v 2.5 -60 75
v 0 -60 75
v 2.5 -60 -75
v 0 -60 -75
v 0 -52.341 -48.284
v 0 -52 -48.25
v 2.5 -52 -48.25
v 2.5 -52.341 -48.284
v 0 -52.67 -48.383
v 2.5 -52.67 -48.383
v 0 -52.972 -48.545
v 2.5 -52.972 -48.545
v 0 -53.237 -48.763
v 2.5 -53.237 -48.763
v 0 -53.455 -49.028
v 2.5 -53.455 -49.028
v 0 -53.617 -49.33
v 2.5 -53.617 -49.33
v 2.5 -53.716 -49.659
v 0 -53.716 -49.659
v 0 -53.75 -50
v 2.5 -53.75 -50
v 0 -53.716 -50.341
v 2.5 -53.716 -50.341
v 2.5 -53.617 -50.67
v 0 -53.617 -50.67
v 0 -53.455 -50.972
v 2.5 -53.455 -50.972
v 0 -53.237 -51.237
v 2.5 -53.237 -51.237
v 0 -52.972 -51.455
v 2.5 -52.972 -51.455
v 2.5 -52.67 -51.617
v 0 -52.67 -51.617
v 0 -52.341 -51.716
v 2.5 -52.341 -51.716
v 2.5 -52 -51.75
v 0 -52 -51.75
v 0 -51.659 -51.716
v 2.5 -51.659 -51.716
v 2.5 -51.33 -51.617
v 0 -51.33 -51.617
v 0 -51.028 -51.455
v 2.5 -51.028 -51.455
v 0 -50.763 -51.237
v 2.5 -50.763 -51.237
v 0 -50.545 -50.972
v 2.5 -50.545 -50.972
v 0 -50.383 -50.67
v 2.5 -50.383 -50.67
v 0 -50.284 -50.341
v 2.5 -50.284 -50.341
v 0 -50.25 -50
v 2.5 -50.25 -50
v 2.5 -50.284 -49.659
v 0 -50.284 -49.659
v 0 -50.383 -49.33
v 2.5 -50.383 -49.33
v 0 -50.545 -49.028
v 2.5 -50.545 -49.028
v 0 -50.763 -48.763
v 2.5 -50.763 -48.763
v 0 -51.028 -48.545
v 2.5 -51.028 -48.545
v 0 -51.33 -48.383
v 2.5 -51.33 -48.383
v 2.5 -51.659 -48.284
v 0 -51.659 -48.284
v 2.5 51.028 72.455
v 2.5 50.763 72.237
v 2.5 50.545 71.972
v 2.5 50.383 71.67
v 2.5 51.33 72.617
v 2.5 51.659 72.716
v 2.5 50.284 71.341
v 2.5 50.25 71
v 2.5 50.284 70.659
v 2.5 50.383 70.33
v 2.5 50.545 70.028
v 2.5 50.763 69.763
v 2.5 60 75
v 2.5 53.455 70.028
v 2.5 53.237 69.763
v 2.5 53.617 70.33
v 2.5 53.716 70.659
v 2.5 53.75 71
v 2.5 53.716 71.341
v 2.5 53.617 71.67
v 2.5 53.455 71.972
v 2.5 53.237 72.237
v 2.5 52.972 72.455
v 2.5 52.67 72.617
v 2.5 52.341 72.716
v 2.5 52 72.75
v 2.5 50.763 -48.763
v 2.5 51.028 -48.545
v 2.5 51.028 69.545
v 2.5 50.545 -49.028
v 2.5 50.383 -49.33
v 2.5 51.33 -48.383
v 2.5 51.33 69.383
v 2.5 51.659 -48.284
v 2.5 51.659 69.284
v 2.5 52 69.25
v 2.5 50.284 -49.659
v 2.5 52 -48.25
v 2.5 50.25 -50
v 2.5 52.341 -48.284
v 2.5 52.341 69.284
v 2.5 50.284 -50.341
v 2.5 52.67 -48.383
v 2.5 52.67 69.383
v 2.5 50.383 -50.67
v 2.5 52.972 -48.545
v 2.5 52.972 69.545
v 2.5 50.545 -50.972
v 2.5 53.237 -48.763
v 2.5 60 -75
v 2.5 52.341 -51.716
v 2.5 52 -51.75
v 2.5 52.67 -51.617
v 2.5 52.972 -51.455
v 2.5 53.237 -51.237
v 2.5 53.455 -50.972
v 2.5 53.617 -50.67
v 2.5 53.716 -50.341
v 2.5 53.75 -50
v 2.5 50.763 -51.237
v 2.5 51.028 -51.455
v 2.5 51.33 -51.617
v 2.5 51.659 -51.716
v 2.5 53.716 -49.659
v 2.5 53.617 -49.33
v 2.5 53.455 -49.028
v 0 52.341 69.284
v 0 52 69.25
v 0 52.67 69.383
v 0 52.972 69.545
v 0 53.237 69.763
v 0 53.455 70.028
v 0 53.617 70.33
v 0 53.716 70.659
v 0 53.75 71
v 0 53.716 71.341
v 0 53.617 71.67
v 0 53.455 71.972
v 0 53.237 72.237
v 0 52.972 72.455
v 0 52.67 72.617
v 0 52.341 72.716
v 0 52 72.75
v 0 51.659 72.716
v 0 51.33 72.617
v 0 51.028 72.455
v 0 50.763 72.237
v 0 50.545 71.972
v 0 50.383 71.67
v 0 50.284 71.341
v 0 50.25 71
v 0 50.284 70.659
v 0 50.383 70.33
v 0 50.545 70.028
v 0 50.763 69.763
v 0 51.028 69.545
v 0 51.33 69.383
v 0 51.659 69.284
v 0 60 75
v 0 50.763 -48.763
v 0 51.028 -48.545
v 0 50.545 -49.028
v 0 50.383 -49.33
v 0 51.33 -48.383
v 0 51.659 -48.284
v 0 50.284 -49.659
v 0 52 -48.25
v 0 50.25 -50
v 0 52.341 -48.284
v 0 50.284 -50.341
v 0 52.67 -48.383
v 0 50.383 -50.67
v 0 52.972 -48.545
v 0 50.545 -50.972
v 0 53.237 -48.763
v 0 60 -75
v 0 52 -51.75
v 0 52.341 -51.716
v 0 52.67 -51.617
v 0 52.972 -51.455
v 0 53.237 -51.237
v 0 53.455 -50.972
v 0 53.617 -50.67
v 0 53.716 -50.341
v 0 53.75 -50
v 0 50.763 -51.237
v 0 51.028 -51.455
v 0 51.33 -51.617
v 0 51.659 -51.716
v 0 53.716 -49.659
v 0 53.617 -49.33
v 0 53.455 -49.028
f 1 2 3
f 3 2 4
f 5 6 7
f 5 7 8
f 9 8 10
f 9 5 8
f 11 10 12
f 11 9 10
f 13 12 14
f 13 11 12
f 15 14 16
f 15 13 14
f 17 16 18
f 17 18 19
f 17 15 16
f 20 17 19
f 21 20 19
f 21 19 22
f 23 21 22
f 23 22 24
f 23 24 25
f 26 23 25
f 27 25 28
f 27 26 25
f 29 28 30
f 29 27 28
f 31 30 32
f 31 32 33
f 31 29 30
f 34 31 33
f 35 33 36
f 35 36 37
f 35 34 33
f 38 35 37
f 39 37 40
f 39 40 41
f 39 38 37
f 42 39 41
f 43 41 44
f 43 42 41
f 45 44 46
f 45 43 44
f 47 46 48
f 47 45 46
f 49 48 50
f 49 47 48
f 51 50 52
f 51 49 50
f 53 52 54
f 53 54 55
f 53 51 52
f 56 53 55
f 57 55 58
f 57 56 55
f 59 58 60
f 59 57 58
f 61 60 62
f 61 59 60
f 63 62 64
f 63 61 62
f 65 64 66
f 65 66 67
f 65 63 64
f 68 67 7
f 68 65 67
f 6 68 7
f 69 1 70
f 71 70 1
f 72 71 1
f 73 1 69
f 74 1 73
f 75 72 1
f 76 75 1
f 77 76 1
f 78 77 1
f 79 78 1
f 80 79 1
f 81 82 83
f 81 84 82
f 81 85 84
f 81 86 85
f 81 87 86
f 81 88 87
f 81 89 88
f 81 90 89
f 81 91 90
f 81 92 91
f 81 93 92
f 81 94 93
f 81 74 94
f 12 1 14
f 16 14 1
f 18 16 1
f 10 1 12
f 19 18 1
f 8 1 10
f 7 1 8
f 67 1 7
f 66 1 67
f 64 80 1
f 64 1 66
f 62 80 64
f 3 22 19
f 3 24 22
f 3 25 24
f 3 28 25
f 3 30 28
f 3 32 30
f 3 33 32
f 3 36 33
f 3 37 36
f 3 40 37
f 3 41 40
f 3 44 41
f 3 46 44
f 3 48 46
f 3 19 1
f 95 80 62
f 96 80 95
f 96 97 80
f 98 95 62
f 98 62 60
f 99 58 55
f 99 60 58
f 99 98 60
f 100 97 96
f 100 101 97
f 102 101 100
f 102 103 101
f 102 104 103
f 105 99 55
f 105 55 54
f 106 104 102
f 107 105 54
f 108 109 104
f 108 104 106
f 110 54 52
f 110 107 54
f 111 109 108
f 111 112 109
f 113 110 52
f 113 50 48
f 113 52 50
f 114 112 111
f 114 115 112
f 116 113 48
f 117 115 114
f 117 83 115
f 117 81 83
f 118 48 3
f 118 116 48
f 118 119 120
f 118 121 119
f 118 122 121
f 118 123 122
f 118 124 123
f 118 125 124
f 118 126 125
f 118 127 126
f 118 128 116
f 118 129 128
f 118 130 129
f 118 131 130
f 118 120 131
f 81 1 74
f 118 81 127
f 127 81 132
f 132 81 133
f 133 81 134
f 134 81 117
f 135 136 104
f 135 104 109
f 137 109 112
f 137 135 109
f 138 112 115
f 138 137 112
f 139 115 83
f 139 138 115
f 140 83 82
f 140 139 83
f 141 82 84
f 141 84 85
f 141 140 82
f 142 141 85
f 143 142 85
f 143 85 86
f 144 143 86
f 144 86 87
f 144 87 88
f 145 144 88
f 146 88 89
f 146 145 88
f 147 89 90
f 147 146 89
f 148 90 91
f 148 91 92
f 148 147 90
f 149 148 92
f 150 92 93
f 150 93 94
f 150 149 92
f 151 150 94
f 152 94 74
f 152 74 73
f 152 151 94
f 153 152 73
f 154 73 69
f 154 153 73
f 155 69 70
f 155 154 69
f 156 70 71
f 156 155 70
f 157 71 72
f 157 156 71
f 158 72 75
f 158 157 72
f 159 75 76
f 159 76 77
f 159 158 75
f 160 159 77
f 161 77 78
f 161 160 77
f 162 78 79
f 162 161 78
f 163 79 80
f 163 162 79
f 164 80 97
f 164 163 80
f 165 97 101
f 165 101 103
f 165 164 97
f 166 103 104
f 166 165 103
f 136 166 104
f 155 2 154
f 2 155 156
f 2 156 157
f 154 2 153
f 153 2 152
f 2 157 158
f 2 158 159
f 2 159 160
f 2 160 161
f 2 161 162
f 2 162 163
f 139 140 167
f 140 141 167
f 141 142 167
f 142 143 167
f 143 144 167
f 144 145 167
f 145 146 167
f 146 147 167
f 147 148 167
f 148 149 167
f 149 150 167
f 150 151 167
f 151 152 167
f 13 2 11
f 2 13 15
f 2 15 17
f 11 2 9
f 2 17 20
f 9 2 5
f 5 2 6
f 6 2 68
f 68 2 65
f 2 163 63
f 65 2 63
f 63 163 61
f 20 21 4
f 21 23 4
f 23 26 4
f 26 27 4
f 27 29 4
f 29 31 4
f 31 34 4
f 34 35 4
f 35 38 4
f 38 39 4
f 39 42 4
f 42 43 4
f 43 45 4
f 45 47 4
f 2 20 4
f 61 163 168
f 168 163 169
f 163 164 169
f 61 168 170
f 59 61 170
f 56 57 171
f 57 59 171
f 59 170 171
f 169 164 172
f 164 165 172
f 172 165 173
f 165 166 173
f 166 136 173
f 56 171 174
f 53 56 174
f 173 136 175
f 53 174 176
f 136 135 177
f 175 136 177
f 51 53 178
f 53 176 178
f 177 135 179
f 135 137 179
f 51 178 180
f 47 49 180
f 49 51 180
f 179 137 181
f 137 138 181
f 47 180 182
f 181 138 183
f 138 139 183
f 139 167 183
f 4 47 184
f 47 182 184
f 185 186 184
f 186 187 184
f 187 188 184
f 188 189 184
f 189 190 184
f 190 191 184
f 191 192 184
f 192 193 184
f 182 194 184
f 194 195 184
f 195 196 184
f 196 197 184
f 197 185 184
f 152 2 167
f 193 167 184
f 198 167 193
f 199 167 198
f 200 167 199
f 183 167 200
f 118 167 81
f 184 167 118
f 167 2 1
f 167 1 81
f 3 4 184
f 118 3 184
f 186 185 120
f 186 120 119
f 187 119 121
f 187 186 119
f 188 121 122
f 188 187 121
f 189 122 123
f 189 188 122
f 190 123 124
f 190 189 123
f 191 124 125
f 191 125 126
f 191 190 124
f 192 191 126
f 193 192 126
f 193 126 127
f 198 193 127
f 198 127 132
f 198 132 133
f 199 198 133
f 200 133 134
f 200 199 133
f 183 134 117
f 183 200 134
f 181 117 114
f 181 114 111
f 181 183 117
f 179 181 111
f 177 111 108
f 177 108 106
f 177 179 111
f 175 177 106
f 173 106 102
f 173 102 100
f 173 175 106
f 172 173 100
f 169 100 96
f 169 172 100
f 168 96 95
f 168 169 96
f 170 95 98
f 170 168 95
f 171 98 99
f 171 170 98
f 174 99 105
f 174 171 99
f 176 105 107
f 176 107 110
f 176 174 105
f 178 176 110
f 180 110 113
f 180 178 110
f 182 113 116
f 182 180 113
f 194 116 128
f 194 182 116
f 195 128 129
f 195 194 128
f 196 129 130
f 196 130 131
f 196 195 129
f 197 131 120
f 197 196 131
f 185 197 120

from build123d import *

# Parameters (mm, degrees)
SKETCH1_W           = 150
SKETCH1_H           = 120
SKETCH1_R           = 1.75
BOSS_EXTRUDE1_DEPTH = 2.5


with BuildPart() as part:
    # Sketch1 → Boss-Extrude1 (new body)
    with BuildSketch(Plane(origin=(0, 0, 0), x_dir=(0, 0, -1), z_dir=(1, 0, 0))):
        Rectangle(SKETCH1_W, SKETCH1_H)
        with Locations((50, 52)):
            Circle(SKETCH1_R, mode=Mode.SUBTRACT)
        with Locations((-71, 52)):
            Circle(SKETCH1_R, mode=Mode.SUBTRACT)
        with Locations(Location((50, -52, 0), (0, 0, 180))):
            Circle(SKETCH1_R, mode=Mode.SUBTRACT)
    extrude(amount=BOSS_EXTRUDE1_DEPTH)


solid = part.part
